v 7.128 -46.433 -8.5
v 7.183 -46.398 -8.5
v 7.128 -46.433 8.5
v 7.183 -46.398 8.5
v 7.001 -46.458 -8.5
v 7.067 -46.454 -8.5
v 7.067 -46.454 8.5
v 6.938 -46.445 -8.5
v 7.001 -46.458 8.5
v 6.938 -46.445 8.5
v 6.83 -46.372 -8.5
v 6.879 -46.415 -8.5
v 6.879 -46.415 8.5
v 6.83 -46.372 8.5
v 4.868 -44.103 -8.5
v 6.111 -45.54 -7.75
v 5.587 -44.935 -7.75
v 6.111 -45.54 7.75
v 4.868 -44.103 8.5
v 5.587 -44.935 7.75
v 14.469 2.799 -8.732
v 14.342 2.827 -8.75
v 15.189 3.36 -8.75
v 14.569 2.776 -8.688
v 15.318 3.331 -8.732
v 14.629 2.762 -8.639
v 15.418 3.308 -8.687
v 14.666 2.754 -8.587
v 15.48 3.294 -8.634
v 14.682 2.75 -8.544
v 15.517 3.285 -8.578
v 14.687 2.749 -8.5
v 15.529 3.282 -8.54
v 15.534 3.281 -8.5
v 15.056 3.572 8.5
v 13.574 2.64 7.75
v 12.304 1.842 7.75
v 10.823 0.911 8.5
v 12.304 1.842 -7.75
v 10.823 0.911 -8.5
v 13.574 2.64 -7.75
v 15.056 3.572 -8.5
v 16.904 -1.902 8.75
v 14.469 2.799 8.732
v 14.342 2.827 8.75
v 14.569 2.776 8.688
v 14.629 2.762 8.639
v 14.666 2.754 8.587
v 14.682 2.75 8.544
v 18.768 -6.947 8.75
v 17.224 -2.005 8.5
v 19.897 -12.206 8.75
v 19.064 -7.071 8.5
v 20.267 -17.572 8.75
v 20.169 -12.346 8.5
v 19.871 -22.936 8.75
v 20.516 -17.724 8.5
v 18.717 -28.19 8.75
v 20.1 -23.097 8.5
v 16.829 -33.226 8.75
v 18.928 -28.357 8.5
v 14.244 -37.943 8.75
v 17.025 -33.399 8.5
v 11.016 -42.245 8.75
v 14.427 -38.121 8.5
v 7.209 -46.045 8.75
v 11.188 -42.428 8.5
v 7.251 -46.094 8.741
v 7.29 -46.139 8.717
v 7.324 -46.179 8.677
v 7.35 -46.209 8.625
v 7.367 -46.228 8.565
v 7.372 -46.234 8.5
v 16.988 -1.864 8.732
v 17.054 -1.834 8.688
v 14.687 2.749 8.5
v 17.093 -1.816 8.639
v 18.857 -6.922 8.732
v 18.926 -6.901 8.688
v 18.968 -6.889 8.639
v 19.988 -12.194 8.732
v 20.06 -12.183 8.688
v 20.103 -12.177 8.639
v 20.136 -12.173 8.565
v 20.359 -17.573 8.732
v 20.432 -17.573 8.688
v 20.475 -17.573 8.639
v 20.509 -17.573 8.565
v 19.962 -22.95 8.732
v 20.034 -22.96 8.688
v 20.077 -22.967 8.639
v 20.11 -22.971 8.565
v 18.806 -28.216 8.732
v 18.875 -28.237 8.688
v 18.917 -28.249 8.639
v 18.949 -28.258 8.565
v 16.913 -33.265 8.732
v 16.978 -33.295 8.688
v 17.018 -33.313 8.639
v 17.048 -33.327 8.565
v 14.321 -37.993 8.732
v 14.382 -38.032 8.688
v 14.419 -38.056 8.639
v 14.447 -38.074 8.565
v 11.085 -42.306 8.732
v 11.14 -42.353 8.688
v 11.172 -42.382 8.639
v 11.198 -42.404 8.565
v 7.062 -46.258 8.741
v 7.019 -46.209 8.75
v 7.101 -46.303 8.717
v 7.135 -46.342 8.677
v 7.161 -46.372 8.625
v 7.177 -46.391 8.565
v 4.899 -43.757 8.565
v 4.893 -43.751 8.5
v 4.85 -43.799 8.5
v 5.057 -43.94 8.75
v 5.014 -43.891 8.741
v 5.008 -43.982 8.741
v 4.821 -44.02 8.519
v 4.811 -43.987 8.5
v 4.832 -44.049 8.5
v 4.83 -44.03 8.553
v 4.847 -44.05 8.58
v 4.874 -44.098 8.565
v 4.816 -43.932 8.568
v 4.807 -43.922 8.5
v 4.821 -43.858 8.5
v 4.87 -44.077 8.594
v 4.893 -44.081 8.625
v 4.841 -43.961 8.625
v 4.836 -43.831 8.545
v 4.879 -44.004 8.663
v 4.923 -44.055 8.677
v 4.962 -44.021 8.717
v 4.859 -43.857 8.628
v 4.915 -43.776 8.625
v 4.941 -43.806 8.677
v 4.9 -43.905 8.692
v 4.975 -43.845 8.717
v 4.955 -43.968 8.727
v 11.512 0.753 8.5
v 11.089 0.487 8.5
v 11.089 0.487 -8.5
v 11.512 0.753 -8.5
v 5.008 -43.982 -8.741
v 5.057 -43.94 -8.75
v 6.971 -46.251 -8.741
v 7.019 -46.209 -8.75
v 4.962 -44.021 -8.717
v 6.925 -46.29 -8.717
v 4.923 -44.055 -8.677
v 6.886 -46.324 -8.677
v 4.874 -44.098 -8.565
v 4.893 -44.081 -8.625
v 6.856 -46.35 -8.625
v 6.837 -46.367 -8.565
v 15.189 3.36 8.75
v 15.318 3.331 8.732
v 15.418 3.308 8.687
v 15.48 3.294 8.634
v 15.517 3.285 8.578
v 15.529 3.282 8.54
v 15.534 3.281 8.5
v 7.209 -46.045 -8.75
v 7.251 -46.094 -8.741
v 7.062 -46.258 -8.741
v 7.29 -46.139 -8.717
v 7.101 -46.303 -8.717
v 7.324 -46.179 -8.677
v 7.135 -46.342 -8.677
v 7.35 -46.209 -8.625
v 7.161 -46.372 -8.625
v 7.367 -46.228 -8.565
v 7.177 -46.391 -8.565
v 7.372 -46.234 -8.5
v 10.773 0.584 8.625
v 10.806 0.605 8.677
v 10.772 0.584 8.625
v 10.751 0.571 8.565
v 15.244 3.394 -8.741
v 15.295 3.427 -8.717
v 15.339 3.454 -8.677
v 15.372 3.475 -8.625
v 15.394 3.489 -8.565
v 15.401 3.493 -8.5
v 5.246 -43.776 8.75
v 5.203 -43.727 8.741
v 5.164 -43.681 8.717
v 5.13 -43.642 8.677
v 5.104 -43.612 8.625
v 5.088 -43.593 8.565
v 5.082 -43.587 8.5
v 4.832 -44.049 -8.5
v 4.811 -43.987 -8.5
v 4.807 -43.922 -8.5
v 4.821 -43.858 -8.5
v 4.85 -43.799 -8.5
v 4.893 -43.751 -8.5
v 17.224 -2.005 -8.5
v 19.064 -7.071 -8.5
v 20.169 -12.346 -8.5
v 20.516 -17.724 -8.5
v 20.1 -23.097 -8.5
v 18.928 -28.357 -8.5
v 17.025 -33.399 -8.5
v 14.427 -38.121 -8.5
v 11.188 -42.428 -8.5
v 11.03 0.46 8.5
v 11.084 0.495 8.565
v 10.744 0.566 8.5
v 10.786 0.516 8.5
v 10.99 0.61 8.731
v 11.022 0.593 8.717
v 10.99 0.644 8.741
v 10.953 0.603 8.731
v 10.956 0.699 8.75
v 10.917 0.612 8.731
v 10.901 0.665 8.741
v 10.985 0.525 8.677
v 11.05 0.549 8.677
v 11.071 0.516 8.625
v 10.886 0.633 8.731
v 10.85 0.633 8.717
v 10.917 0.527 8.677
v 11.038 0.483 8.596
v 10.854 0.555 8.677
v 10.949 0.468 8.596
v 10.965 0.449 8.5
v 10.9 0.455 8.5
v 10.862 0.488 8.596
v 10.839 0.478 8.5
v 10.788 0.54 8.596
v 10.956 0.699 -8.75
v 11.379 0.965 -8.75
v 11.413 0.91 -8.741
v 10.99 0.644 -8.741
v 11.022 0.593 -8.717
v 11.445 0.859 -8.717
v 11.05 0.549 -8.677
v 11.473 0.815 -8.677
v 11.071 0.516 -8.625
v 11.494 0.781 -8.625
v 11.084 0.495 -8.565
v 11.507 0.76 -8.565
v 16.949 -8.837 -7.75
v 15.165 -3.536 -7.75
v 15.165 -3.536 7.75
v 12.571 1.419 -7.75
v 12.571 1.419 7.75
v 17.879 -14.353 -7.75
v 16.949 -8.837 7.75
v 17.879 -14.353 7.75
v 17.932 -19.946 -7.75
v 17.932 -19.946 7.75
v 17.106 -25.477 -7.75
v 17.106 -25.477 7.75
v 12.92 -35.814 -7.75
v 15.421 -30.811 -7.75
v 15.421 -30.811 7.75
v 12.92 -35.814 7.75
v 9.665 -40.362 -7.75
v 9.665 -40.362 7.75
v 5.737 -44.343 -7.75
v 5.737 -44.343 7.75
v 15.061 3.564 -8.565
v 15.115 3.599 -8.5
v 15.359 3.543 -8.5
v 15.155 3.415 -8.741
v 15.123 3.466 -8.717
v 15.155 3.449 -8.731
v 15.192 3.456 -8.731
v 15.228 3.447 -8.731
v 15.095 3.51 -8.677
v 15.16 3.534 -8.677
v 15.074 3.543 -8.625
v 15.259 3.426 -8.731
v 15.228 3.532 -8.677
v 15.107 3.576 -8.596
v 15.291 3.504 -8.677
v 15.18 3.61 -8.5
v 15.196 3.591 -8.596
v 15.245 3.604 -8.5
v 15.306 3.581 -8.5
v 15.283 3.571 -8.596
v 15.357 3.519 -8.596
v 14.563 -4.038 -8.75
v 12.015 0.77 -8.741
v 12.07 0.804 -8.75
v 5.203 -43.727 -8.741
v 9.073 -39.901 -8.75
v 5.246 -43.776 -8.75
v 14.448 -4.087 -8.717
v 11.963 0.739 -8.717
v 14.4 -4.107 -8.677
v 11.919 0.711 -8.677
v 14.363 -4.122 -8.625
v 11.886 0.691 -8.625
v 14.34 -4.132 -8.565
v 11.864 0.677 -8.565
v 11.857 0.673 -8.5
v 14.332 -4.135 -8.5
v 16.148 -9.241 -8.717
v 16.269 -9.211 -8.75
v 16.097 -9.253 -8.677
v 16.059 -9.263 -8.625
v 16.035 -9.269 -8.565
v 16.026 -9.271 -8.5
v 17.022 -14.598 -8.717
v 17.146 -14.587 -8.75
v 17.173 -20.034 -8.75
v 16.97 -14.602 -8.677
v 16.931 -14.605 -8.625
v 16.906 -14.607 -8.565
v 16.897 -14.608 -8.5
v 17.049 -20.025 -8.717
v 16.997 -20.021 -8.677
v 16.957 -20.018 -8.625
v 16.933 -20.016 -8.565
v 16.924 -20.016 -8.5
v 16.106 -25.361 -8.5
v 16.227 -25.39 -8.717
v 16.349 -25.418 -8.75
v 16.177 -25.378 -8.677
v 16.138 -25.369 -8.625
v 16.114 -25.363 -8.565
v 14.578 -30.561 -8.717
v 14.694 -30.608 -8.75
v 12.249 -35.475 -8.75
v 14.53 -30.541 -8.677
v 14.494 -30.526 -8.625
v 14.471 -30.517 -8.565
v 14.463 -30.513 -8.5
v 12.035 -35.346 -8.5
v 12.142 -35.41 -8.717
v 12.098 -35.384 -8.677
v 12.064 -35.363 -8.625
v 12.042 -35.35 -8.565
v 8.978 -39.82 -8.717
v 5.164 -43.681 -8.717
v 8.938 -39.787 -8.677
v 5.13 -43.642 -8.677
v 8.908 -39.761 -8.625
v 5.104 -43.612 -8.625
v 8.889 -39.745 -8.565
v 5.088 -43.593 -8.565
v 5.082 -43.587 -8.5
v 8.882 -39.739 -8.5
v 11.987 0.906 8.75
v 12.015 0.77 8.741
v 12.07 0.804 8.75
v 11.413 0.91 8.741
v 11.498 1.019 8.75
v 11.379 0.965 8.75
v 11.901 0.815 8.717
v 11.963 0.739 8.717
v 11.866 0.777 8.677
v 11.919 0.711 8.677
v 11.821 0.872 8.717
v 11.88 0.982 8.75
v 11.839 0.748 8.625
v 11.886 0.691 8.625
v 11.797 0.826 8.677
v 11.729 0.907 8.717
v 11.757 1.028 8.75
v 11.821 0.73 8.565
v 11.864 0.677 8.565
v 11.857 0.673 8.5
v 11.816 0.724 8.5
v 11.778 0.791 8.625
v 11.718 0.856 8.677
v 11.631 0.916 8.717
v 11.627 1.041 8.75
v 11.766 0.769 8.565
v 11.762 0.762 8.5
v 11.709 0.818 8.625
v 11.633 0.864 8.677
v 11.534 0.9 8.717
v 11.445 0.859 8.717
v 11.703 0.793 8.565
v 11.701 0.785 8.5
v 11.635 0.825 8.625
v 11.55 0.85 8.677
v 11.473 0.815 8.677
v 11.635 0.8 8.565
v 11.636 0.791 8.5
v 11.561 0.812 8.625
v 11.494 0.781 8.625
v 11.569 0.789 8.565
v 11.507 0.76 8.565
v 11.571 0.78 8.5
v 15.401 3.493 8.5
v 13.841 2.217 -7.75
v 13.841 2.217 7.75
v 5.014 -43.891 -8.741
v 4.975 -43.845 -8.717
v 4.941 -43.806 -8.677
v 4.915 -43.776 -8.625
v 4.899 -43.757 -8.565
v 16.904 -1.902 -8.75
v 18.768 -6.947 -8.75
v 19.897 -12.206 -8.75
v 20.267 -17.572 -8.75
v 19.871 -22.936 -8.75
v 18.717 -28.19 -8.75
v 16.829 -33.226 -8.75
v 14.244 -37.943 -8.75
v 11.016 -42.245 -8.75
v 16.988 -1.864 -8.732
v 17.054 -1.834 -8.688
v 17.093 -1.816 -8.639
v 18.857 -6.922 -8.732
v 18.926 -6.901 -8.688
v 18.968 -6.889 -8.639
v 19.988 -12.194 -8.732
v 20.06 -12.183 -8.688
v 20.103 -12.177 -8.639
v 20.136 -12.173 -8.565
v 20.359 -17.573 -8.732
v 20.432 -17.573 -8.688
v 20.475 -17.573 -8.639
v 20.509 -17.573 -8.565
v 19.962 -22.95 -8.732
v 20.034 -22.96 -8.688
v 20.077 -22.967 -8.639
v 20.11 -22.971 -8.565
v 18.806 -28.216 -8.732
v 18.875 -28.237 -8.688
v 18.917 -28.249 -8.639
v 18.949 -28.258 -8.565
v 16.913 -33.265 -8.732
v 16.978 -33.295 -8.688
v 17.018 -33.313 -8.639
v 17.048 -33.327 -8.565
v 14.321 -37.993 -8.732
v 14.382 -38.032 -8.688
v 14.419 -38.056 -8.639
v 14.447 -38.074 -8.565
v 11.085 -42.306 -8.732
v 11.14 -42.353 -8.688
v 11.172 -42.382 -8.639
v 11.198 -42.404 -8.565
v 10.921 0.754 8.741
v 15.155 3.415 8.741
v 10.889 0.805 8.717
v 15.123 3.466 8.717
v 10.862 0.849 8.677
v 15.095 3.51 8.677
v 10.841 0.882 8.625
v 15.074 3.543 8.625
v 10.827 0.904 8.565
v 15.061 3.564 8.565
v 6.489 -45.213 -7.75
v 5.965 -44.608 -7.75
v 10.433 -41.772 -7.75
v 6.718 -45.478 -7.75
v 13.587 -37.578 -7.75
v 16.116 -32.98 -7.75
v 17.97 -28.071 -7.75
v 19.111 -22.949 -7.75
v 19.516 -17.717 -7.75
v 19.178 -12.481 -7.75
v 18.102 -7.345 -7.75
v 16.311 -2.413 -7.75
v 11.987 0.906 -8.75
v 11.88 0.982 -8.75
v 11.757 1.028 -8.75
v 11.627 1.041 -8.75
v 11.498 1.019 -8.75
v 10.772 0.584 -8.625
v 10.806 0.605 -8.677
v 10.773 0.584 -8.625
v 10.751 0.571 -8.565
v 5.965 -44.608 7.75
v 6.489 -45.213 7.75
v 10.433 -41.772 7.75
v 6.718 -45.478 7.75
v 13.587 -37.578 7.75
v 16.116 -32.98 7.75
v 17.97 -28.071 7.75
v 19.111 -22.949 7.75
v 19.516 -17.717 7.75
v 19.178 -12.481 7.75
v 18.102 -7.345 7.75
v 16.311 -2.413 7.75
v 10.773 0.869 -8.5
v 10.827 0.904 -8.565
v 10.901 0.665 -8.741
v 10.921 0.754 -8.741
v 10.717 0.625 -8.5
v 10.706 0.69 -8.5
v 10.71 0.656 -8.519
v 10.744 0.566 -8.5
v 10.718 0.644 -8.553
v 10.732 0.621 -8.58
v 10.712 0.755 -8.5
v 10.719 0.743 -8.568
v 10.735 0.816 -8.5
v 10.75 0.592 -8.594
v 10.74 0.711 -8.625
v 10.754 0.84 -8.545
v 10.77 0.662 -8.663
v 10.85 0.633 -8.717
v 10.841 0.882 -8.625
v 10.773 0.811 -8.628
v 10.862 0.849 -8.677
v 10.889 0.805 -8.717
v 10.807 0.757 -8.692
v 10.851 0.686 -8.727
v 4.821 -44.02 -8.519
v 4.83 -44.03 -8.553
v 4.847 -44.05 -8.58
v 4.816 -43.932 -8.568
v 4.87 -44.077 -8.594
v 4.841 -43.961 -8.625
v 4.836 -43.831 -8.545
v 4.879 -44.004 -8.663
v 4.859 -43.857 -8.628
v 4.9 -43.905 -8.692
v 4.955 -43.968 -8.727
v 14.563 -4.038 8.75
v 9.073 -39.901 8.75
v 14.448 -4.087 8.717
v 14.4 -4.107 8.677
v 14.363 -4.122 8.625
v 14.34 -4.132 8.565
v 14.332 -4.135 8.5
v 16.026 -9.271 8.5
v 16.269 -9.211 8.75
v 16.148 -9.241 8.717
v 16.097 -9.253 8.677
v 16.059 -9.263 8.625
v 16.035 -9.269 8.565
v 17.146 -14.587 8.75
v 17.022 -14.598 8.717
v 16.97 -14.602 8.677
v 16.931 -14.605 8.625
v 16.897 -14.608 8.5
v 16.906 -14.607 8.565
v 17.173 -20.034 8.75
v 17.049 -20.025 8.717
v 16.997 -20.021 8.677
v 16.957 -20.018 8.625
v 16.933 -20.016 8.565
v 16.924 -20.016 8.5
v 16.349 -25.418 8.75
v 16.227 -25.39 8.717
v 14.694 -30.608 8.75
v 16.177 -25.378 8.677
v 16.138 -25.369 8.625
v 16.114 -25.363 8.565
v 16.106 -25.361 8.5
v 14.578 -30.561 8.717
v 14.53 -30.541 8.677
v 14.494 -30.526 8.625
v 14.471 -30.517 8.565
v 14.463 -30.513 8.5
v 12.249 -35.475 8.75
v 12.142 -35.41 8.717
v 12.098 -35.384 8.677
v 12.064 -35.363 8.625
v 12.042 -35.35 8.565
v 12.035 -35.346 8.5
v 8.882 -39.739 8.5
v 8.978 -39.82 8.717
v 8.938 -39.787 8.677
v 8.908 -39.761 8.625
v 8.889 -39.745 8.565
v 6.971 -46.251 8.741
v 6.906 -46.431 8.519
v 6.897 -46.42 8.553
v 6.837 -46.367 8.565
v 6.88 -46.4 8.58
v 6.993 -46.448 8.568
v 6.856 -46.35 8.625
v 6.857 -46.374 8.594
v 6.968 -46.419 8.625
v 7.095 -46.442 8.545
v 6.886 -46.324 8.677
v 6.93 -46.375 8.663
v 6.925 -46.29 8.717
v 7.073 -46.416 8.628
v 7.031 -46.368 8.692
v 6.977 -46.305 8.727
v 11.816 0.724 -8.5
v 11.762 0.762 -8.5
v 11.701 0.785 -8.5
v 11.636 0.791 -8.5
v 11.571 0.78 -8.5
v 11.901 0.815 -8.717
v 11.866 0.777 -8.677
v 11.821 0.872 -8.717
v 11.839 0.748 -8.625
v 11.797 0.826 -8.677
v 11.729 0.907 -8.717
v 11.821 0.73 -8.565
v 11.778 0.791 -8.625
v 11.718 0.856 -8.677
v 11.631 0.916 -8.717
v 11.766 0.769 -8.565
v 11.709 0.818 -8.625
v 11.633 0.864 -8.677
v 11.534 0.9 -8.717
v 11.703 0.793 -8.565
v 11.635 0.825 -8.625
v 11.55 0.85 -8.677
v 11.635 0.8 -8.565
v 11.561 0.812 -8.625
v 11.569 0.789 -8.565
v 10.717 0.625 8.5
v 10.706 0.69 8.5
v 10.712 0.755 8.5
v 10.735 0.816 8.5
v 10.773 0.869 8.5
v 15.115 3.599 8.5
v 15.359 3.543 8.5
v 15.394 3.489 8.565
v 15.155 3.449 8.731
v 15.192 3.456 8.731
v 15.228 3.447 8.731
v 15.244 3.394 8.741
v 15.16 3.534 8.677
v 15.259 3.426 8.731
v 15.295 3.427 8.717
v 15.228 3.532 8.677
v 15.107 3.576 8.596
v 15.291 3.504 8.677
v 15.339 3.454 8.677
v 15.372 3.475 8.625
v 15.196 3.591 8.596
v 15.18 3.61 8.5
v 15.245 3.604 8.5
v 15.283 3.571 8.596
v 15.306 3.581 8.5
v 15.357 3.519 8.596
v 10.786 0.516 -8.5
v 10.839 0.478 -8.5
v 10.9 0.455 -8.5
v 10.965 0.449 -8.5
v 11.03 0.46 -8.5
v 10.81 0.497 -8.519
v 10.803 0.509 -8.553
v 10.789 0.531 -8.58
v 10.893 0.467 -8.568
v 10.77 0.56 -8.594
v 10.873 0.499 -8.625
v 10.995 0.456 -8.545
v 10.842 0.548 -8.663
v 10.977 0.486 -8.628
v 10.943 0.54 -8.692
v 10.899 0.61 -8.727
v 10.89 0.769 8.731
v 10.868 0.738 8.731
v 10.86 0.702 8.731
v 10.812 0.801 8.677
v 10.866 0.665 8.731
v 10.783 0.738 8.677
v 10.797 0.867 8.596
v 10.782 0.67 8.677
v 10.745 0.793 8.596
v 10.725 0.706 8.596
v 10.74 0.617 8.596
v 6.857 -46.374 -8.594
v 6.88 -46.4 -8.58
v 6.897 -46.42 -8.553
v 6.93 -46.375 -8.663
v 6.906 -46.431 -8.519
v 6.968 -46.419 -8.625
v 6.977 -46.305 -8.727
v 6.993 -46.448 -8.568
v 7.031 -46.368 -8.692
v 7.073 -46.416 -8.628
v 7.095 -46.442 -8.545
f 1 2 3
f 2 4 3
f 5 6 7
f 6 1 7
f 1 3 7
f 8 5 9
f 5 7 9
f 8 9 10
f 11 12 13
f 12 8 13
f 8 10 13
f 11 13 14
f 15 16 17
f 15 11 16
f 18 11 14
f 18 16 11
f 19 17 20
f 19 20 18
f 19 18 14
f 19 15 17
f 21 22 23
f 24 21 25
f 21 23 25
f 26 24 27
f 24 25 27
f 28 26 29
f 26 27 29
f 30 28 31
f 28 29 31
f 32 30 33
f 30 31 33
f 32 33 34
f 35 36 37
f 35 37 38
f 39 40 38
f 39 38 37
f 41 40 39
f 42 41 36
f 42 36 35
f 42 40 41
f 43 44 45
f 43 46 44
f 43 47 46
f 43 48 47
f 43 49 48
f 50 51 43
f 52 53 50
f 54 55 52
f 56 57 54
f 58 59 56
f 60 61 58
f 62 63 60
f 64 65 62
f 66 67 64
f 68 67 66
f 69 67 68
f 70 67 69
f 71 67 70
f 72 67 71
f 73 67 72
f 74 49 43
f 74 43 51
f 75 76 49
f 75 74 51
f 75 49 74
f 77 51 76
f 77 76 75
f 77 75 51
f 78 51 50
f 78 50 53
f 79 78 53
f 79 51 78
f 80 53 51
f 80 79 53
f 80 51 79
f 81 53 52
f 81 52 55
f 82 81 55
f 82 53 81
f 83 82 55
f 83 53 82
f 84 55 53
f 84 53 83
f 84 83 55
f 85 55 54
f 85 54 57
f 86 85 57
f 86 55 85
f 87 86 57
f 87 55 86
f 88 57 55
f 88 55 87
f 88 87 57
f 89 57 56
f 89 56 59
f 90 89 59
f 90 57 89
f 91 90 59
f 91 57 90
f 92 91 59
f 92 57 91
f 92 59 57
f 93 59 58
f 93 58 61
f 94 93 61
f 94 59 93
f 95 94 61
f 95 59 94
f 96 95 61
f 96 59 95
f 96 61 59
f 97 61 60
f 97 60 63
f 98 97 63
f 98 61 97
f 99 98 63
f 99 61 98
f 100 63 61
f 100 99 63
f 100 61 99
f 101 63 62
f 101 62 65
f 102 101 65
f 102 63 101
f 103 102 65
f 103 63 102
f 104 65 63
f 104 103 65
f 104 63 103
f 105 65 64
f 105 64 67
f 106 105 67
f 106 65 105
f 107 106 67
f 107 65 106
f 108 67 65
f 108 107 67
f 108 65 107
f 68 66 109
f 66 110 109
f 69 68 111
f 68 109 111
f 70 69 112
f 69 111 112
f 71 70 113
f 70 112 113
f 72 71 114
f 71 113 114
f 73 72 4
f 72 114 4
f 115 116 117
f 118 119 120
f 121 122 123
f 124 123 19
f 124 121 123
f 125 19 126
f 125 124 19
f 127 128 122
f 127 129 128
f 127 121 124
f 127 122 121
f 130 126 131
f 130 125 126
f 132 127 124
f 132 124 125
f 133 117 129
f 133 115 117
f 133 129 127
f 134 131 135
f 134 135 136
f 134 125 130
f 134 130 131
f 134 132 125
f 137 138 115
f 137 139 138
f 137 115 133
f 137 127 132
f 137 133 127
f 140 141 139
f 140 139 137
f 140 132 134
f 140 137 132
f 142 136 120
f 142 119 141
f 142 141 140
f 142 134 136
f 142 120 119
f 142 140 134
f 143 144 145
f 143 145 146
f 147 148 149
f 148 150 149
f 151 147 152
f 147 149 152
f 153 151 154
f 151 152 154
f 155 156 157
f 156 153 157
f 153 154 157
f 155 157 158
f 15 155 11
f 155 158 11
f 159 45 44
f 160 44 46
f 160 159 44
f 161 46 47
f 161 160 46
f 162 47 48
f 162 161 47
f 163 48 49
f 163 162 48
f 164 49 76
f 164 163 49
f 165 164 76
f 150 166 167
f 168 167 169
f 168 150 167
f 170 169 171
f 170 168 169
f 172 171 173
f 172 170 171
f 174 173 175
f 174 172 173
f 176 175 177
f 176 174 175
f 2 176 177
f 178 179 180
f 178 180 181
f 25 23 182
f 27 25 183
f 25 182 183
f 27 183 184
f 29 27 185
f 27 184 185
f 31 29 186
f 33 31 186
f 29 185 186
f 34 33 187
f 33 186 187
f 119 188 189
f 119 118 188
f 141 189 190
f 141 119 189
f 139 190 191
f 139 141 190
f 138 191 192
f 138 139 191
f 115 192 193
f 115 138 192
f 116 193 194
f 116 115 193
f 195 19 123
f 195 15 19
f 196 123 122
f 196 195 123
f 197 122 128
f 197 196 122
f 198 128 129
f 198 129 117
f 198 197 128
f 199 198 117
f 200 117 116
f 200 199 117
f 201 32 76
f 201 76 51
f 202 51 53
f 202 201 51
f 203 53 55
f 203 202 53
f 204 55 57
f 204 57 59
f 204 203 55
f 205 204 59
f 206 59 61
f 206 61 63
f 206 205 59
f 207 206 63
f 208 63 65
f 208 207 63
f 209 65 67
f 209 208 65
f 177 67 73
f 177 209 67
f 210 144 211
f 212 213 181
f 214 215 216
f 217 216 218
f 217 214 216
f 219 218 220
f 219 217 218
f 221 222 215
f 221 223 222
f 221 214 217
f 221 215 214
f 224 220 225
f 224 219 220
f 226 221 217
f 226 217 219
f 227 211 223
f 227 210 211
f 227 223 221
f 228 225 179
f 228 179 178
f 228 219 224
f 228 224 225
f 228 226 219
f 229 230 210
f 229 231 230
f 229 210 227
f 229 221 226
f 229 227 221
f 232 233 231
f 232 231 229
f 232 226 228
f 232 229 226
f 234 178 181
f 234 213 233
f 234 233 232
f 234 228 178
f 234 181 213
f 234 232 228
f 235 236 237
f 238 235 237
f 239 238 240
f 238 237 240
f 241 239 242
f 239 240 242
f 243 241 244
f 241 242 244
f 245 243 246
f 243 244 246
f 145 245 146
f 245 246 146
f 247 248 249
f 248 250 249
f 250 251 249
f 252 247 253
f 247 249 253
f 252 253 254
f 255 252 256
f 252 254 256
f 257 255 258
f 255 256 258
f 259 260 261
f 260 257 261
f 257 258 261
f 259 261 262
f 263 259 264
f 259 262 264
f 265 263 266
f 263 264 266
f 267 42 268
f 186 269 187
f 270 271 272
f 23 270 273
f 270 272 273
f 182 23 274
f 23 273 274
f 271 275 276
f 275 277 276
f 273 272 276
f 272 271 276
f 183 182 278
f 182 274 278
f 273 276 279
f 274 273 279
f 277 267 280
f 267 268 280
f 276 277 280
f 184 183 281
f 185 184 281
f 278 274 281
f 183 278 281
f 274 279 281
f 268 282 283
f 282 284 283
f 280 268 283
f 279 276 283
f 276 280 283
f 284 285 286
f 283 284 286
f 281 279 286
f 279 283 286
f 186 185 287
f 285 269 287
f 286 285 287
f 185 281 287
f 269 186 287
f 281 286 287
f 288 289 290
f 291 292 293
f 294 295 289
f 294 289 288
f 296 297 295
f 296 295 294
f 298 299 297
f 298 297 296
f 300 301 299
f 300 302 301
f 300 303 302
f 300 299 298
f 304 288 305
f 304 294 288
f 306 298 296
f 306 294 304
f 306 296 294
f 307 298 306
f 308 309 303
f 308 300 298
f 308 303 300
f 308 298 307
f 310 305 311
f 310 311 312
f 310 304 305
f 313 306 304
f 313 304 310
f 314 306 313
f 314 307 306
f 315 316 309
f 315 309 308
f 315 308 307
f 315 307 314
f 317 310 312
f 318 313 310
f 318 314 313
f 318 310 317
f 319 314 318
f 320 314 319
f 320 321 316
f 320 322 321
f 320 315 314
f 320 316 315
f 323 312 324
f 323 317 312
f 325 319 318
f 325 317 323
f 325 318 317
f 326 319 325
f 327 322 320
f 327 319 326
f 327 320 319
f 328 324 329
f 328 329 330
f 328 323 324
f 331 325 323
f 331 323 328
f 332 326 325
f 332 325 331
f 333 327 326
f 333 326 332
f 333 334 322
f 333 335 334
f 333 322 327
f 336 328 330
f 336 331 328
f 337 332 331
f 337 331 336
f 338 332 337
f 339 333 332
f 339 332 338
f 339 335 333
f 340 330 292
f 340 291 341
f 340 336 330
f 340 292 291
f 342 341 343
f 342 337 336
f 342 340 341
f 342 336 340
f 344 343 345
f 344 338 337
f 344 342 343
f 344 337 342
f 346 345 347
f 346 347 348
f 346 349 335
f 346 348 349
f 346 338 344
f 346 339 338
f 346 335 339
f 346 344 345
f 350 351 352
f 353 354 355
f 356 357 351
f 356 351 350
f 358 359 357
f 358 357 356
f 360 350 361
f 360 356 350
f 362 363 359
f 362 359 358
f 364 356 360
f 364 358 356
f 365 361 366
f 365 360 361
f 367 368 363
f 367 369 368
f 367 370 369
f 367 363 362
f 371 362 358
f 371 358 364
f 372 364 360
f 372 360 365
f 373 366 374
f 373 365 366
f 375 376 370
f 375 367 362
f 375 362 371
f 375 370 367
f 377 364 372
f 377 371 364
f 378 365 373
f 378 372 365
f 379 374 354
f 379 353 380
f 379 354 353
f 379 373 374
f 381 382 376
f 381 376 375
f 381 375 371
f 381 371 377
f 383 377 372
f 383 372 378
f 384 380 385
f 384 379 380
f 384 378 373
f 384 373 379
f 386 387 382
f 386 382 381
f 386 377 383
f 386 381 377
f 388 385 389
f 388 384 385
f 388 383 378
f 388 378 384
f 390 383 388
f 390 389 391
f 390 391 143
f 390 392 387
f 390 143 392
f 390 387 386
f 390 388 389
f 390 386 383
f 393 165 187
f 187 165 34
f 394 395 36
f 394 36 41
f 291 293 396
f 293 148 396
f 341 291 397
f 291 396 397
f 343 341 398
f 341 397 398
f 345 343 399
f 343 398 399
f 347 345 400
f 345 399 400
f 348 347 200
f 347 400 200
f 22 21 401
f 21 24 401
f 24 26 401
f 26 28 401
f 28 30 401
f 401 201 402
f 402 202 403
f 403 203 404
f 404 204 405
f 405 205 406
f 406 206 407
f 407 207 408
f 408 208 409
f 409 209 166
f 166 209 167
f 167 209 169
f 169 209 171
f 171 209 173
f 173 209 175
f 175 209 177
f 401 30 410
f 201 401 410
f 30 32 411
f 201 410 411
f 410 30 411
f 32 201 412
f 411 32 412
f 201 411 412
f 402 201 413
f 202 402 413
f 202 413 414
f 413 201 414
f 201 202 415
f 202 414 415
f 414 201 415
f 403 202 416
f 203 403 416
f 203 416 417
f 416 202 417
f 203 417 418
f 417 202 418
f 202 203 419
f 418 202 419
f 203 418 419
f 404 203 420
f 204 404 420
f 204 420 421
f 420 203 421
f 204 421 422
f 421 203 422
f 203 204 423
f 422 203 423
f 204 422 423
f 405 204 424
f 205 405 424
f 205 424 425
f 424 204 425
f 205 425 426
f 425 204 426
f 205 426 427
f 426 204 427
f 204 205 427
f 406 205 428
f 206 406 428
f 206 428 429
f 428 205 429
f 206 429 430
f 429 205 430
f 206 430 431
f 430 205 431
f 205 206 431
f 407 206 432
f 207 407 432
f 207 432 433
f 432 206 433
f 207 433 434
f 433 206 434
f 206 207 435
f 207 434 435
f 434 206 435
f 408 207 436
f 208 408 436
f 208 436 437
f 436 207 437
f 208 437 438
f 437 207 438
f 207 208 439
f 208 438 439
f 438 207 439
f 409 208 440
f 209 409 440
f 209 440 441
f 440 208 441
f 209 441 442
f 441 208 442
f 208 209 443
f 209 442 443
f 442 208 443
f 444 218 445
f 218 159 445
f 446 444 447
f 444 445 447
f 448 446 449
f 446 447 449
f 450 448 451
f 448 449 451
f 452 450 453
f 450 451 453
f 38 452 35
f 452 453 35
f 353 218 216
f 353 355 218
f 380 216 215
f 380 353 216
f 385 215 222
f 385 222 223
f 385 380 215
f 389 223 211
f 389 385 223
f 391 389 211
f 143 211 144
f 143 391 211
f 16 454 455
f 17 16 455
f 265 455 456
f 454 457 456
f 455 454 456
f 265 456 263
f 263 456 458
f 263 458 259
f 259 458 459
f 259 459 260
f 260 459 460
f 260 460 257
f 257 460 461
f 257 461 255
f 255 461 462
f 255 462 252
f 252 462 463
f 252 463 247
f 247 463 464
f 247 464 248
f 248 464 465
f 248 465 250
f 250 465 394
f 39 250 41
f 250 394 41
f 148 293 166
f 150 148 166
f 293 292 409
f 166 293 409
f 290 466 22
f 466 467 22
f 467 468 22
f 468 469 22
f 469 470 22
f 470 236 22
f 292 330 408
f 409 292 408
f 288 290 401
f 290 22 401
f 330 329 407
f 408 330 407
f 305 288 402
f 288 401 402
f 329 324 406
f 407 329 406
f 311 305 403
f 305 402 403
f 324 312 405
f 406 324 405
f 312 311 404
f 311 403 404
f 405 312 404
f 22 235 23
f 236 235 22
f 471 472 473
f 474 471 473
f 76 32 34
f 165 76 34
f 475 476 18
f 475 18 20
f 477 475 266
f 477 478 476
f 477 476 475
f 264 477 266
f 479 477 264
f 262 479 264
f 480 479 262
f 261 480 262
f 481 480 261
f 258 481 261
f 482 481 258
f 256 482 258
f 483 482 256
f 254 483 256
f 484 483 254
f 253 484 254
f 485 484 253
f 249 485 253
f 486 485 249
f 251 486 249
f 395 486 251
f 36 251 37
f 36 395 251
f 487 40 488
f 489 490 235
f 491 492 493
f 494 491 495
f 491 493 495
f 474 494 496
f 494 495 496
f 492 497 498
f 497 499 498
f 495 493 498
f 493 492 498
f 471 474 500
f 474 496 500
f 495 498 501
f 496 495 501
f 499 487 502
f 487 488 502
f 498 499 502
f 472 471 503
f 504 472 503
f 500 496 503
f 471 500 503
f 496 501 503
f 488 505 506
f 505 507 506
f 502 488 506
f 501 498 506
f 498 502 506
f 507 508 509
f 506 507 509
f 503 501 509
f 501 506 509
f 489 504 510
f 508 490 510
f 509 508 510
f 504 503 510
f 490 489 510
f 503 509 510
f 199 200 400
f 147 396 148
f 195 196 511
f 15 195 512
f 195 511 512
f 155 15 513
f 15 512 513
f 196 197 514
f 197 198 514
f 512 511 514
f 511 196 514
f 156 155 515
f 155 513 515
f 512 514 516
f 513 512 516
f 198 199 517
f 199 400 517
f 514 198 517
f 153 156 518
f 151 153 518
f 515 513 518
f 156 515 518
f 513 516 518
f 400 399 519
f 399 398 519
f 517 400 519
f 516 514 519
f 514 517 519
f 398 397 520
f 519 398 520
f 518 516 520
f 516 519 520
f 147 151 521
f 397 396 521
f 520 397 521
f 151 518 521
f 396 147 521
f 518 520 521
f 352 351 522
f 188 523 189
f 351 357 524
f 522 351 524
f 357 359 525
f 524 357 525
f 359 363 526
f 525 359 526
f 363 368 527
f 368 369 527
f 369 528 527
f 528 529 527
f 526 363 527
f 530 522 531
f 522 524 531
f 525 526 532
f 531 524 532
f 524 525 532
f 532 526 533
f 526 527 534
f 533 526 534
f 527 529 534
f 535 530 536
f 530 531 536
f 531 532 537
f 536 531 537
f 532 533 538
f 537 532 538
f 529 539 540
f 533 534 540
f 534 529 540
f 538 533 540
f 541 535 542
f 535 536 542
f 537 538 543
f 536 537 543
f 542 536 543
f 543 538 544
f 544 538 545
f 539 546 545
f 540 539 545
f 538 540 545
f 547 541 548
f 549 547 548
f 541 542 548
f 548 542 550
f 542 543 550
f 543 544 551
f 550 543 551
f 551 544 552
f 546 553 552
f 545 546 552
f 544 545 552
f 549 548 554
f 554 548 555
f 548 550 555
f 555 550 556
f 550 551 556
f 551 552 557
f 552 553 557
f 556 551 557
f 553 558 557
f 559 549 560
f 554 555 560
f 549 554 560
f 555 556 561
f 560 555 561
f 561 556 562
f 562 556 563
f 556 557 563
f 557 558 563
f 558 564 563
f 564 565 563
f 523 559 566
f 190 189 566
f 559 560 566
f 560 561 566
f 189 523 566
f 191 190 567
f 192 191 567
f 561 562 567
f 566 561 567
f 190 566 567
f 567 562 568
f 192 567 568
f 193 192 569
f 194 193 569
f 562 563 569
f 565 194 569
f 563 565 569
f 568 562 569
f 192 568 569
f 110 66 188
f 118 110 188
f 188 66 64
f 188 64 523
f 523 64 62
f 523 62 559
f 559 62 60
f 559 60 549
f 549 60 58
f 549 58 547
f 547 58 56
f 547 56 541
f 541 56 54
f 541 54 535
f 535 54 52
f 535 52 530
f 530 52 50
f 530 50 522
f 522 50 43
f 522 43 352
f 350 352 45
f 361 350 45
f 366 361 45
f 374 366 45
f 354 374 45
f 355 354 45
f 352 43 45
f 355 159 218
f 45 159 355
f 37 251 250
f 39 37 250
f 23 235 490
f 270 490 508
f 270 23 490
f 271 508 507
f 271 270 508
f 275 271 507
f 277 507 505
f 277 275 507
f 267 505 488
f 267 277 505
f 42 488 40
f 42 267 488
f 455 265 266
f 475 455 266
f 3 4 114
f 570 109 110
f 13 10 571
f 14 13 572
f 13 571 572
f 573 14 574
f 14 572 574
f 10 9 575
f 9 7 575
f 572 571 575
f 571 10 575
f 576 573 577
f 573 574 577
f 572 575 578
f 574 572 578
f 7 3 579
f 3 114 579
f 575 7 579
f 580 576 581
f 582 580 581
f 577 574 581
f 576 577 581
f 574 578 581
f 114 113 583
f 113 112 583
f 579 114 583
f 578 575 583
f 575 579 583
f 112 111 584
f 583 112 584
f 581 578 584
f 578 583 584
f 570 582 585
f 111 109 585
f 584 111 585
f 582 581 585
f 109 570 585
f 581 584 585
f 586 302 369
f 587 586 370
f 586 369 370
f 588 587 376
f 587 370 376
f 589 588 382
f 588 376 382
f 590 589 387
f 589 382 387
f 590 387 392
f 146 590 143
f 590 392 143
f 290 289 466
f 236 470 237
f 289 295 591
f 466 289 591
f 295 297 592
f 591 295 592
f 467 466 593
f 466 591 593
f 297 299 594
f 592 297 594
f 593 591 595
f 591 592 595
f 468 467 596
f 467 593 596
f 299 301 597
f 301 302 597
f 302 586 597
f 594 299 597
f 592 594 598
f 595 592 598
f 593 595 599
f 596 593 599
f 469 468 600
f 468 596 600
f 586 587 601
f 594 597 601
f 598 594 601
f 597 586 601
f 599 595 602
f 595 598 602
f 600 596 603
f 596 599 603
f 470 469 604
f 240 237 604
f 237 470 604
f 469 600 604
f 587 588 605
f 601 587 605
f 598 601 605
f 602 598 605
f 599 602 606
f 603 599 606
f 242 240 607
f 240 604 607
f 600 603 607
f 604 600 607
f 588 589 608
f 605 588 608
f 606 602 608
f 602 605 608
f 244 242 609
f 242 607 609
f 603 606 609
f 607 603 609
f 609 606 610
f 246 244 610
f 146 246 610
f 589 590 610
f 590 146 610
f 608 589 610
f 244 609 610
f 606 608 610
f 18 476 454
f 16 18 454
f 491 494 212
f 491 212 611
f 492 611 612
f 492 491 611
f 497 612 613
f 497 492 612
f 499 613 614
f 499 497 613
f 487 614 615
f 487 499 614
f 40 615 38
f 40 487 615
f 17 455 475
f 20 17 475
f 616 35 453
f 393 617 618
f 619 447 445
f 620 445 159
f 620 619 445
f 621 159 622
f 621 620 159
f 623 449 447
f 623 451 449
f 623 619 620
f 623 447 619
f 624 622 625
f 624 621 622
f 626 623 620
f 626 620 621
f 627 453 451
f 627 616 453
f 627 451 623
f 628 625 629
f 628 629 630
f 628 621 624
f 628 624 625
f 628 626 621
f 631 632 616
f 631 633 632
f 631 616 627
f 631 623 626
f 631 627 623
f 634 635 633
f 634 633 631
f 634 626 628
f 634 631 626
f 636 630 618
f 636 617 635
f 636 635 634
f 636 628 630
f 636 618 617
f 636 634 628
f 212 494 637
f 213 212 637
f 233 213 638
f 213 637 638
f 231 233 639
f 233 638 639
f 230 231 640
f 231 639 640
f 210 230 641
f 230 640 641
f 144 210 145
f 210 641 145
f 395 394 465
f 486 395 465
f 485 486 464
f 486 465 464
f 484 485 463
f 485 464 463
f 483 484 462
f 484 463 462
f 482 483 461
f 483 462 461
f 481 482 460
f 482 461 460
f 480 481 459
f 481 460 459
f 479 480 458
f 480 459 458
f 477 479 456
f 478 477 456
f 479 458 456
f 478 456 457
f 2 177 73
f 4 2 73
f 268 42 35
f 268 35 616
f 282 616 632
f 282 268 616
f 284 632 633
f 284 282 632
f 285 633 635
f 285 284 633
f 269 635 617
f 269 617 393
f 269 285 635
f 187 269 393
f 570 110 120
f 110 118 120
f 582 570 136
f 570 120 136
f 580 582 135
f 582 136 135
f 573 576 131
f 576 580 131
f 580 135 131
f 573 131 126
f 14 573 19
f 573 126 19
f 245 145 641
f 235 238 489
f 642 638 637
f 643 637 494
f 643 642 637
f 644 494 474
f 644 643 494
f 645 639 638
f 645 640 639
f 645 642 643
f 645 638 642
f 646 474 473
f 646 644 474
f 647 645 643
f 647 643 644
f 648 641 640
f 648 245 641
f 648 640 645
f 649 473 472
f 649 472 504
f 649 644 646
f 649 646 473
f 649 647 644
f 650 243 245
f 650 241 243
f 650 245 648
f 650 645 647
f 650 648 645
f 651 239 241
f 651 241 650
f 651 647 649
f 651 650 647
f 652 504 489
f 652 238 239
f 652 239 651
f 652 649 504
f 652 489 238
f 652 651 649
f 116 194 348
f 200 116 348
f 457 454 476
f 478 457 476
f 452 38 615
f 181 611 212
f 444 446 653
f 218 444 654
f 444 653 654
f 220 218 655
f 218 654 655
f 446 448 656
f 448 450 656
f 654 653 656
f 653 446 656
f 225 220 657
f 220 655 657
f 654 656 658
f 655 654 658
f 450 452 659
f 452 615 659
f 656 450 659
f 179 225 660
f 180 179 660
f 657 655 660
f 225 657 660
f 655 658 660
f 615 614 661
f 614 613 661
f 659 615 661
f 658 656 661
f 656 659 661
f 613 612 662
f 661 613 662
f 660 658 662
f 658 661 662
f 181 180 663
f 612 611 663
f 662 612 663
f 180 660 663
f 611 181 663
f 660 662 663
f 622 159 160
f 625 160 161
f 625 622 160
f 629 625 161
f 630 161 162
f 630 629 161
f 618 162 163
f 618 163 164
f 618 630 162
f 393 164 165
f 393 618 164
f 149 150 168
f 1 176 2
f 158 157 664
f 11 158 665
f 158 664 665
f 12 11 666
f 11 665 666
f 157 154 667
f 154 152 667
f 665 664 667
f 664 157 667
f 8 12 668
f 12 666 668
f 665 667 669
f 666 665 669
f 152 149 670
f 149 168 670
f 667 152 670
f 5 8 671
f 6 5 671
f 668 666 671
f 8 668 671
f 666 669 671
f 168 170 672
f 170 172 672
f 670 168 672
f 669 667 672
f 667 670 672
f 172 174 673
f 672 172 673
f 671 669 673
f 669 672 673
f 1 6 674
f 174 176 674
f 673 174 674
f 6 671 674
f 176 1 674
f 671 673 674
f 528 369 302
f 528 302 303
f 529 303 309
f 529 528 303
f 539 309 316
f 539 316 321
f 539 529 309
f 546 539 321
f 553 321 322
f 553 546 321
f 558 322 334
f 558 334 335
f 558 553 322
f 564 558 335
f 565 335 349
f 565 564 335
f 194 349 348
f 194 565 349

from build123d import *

# Parameters (mm, degrees)
SKETCH10_W          = 3.5
SKETCH10_H          = 17.5
SHELL1_T            = -1
SKETCH11_W          = 5.5
SKETCH11_H          = 17.5
SKETCH11_W_2        = 1.5
SKETCH11_H_2        = 15.5
BOSS_EXTRUDE1_DEPTH = 0.5
SKETCH12_W          = 15.5
SKETCH12_H          = 0.35
SKETCH12_W_2        = 1
SKETCH12_H_2        = 0.8
BOSS_EXTRUDE2_DEPTH = 0.5
FILLET1_R           = 0.25


with BuildPart() as part:
    # Sweep1: sweep along a path in Sketch7
    with BuildLine(Plane.XY) as sweep1_path:
        ThreePointArc((11.723892809, 0.886599981), (16.638600451, -22.580062041), (5.082270205, -43.586961119))
    # Sketch10 → Sweep1 (sweep)
    with BuildSketch(Plane(origin=(0, -17.481848747, 0), x_dir=(1, 0, 0), z_dir=(0, 1, 0))):
        with Locations((18.767181512, 0)):
            Rectangle(SKETCH10_W, SKETCH10_H)
    sweep(path=sweep1_path.line)

    # Shell1
    shell1_openings = [part.faces().sort_by_distance(p)[0] for p in [
        (6.227177499, -44.910474357, 0),
        (13.205526307, 1.817869101, 0),
    ]]
    offset(amount=SHELL1_T, openings=shell1_openings, kind=Kind.INTERSECTION)

    # Sketch11 → Boss-Extrude1 (add)
    with BuildSketch(Plane(origin=(2.920606872, -4.646636383, 0), x_dir=(0.8466477136319881, 0.5321537832259836, 0), z_dir=(-0.5321537832259836, 0.8466477136319881, 0))):
        with Locations((12.147814575, 0)):
            Rectangle(SKETCH11_W, SKETCH11_H)
        with Locations((12.147814575, 0)):
            Rectangle(SKETCH11_W_2, SKETCH11_H_2, mode=Mode.SUBTRACT)
    extrude(amount=BOSS_EXTRUDE1_DEPTH)

    # Sketch12 → Boss-Extrude2 (add)
    with BuildSketch(Plane(origin=(-18.659517469, -16.141446142, 0), x_dir=(0, 0, 1), z_dir=(-0.7562932785342891, -0.654232739049229, 0))):
        Polygon((-7.75, -38.439513283), (-8.75, -38.439513283), (-8.75, -39.789513283), (8.75, -39.789513283), (8.75, -38.439513283), (7.75, -38.439513283), (7.75, -38.789513283), (-7.75, -38.789513283), align=None)
        with Locations((0, -38.614513283)):
            Rectangle(SKETCH12_W, SKETCH12_H)
        Polygon((8.75, -36.289513283), (-8.75, -36.289513283), (-8.75, -37.639513283), (-7.75, -37.639513283), (-7.75, -37.289513283), (7.75, -37.289513283), (7.75, -37.639513283), (8.75, -37.639513283), align=None)
        with Locations((0, -37.464513283)):
            Rectangle(SKETCH12_W, SKETCH12_H)
        with Locations((8.25, -38.039513283)):
            Rectangle(SKETCH12_W_2, SKETCH12_H_2)
        with Locations((-8.25, -38.039513283)):
            Rectangle(SKETCH12_W_2, SKETCH12_H_2)
    extrude(amount=BOSS_EXTRUDE2_DEPTH)

    # Fillet1
    fillet1_edges = [part.edges().sort_by_distance(p)[0] for p in [
        (16.638600451, -22.580062041, -8.75),
        (16.638600451, -22.580062041, 8.75),
        (20.100212795, -23.097014635, 8.75),
        (20.100212795, -23.097014635, -8.75),
        (15.267730628, 3.704615862, 0),
        (12.939449416, 2.241192958, -8.75),
        (10.611168203, 0.777770054, 0),
        (12.939449416, 2.241192958, 8.75),
        (15.400769074, 3.492953934, 8.75),
        (15.110483663, 3.015215114, -8.75),
        (11.300568952, 0.620523089, -8.75),
        (15.400769074, 3.492953934, -8.75),
        (10.877245095, 0.354446198, 0),
        (10.744206649, 0.566108126, -8.75),
        (11.300568952, 0.620523089, 8.75),
        (15.110483663, 3.015215114, 8.75),
        (10.744206649, 0.566108126, 8.75),
        (11.723892809, 0.886599981, 0),
        (4.893196886, -43.750519304, 8.75),
        (4.893196886, -43.750519304, -8.75),
        (7.183011472, -46.397545779, -8.75),
        (7.183011472, -46.397545779, 8.75),
        (4.704123566, -43.914077489, 0),
        (5.849030859, -45.237590726, -8.75),
        (6.993938153, -46.561103964, 0),
        (5.849030859, -45.237590726, 8.75),
    ]]
    fillet(fillet1_edges, radius=FILLET1_R - 0.0001)  # a hair under: the kernel refuses the full size


solid = part.part
